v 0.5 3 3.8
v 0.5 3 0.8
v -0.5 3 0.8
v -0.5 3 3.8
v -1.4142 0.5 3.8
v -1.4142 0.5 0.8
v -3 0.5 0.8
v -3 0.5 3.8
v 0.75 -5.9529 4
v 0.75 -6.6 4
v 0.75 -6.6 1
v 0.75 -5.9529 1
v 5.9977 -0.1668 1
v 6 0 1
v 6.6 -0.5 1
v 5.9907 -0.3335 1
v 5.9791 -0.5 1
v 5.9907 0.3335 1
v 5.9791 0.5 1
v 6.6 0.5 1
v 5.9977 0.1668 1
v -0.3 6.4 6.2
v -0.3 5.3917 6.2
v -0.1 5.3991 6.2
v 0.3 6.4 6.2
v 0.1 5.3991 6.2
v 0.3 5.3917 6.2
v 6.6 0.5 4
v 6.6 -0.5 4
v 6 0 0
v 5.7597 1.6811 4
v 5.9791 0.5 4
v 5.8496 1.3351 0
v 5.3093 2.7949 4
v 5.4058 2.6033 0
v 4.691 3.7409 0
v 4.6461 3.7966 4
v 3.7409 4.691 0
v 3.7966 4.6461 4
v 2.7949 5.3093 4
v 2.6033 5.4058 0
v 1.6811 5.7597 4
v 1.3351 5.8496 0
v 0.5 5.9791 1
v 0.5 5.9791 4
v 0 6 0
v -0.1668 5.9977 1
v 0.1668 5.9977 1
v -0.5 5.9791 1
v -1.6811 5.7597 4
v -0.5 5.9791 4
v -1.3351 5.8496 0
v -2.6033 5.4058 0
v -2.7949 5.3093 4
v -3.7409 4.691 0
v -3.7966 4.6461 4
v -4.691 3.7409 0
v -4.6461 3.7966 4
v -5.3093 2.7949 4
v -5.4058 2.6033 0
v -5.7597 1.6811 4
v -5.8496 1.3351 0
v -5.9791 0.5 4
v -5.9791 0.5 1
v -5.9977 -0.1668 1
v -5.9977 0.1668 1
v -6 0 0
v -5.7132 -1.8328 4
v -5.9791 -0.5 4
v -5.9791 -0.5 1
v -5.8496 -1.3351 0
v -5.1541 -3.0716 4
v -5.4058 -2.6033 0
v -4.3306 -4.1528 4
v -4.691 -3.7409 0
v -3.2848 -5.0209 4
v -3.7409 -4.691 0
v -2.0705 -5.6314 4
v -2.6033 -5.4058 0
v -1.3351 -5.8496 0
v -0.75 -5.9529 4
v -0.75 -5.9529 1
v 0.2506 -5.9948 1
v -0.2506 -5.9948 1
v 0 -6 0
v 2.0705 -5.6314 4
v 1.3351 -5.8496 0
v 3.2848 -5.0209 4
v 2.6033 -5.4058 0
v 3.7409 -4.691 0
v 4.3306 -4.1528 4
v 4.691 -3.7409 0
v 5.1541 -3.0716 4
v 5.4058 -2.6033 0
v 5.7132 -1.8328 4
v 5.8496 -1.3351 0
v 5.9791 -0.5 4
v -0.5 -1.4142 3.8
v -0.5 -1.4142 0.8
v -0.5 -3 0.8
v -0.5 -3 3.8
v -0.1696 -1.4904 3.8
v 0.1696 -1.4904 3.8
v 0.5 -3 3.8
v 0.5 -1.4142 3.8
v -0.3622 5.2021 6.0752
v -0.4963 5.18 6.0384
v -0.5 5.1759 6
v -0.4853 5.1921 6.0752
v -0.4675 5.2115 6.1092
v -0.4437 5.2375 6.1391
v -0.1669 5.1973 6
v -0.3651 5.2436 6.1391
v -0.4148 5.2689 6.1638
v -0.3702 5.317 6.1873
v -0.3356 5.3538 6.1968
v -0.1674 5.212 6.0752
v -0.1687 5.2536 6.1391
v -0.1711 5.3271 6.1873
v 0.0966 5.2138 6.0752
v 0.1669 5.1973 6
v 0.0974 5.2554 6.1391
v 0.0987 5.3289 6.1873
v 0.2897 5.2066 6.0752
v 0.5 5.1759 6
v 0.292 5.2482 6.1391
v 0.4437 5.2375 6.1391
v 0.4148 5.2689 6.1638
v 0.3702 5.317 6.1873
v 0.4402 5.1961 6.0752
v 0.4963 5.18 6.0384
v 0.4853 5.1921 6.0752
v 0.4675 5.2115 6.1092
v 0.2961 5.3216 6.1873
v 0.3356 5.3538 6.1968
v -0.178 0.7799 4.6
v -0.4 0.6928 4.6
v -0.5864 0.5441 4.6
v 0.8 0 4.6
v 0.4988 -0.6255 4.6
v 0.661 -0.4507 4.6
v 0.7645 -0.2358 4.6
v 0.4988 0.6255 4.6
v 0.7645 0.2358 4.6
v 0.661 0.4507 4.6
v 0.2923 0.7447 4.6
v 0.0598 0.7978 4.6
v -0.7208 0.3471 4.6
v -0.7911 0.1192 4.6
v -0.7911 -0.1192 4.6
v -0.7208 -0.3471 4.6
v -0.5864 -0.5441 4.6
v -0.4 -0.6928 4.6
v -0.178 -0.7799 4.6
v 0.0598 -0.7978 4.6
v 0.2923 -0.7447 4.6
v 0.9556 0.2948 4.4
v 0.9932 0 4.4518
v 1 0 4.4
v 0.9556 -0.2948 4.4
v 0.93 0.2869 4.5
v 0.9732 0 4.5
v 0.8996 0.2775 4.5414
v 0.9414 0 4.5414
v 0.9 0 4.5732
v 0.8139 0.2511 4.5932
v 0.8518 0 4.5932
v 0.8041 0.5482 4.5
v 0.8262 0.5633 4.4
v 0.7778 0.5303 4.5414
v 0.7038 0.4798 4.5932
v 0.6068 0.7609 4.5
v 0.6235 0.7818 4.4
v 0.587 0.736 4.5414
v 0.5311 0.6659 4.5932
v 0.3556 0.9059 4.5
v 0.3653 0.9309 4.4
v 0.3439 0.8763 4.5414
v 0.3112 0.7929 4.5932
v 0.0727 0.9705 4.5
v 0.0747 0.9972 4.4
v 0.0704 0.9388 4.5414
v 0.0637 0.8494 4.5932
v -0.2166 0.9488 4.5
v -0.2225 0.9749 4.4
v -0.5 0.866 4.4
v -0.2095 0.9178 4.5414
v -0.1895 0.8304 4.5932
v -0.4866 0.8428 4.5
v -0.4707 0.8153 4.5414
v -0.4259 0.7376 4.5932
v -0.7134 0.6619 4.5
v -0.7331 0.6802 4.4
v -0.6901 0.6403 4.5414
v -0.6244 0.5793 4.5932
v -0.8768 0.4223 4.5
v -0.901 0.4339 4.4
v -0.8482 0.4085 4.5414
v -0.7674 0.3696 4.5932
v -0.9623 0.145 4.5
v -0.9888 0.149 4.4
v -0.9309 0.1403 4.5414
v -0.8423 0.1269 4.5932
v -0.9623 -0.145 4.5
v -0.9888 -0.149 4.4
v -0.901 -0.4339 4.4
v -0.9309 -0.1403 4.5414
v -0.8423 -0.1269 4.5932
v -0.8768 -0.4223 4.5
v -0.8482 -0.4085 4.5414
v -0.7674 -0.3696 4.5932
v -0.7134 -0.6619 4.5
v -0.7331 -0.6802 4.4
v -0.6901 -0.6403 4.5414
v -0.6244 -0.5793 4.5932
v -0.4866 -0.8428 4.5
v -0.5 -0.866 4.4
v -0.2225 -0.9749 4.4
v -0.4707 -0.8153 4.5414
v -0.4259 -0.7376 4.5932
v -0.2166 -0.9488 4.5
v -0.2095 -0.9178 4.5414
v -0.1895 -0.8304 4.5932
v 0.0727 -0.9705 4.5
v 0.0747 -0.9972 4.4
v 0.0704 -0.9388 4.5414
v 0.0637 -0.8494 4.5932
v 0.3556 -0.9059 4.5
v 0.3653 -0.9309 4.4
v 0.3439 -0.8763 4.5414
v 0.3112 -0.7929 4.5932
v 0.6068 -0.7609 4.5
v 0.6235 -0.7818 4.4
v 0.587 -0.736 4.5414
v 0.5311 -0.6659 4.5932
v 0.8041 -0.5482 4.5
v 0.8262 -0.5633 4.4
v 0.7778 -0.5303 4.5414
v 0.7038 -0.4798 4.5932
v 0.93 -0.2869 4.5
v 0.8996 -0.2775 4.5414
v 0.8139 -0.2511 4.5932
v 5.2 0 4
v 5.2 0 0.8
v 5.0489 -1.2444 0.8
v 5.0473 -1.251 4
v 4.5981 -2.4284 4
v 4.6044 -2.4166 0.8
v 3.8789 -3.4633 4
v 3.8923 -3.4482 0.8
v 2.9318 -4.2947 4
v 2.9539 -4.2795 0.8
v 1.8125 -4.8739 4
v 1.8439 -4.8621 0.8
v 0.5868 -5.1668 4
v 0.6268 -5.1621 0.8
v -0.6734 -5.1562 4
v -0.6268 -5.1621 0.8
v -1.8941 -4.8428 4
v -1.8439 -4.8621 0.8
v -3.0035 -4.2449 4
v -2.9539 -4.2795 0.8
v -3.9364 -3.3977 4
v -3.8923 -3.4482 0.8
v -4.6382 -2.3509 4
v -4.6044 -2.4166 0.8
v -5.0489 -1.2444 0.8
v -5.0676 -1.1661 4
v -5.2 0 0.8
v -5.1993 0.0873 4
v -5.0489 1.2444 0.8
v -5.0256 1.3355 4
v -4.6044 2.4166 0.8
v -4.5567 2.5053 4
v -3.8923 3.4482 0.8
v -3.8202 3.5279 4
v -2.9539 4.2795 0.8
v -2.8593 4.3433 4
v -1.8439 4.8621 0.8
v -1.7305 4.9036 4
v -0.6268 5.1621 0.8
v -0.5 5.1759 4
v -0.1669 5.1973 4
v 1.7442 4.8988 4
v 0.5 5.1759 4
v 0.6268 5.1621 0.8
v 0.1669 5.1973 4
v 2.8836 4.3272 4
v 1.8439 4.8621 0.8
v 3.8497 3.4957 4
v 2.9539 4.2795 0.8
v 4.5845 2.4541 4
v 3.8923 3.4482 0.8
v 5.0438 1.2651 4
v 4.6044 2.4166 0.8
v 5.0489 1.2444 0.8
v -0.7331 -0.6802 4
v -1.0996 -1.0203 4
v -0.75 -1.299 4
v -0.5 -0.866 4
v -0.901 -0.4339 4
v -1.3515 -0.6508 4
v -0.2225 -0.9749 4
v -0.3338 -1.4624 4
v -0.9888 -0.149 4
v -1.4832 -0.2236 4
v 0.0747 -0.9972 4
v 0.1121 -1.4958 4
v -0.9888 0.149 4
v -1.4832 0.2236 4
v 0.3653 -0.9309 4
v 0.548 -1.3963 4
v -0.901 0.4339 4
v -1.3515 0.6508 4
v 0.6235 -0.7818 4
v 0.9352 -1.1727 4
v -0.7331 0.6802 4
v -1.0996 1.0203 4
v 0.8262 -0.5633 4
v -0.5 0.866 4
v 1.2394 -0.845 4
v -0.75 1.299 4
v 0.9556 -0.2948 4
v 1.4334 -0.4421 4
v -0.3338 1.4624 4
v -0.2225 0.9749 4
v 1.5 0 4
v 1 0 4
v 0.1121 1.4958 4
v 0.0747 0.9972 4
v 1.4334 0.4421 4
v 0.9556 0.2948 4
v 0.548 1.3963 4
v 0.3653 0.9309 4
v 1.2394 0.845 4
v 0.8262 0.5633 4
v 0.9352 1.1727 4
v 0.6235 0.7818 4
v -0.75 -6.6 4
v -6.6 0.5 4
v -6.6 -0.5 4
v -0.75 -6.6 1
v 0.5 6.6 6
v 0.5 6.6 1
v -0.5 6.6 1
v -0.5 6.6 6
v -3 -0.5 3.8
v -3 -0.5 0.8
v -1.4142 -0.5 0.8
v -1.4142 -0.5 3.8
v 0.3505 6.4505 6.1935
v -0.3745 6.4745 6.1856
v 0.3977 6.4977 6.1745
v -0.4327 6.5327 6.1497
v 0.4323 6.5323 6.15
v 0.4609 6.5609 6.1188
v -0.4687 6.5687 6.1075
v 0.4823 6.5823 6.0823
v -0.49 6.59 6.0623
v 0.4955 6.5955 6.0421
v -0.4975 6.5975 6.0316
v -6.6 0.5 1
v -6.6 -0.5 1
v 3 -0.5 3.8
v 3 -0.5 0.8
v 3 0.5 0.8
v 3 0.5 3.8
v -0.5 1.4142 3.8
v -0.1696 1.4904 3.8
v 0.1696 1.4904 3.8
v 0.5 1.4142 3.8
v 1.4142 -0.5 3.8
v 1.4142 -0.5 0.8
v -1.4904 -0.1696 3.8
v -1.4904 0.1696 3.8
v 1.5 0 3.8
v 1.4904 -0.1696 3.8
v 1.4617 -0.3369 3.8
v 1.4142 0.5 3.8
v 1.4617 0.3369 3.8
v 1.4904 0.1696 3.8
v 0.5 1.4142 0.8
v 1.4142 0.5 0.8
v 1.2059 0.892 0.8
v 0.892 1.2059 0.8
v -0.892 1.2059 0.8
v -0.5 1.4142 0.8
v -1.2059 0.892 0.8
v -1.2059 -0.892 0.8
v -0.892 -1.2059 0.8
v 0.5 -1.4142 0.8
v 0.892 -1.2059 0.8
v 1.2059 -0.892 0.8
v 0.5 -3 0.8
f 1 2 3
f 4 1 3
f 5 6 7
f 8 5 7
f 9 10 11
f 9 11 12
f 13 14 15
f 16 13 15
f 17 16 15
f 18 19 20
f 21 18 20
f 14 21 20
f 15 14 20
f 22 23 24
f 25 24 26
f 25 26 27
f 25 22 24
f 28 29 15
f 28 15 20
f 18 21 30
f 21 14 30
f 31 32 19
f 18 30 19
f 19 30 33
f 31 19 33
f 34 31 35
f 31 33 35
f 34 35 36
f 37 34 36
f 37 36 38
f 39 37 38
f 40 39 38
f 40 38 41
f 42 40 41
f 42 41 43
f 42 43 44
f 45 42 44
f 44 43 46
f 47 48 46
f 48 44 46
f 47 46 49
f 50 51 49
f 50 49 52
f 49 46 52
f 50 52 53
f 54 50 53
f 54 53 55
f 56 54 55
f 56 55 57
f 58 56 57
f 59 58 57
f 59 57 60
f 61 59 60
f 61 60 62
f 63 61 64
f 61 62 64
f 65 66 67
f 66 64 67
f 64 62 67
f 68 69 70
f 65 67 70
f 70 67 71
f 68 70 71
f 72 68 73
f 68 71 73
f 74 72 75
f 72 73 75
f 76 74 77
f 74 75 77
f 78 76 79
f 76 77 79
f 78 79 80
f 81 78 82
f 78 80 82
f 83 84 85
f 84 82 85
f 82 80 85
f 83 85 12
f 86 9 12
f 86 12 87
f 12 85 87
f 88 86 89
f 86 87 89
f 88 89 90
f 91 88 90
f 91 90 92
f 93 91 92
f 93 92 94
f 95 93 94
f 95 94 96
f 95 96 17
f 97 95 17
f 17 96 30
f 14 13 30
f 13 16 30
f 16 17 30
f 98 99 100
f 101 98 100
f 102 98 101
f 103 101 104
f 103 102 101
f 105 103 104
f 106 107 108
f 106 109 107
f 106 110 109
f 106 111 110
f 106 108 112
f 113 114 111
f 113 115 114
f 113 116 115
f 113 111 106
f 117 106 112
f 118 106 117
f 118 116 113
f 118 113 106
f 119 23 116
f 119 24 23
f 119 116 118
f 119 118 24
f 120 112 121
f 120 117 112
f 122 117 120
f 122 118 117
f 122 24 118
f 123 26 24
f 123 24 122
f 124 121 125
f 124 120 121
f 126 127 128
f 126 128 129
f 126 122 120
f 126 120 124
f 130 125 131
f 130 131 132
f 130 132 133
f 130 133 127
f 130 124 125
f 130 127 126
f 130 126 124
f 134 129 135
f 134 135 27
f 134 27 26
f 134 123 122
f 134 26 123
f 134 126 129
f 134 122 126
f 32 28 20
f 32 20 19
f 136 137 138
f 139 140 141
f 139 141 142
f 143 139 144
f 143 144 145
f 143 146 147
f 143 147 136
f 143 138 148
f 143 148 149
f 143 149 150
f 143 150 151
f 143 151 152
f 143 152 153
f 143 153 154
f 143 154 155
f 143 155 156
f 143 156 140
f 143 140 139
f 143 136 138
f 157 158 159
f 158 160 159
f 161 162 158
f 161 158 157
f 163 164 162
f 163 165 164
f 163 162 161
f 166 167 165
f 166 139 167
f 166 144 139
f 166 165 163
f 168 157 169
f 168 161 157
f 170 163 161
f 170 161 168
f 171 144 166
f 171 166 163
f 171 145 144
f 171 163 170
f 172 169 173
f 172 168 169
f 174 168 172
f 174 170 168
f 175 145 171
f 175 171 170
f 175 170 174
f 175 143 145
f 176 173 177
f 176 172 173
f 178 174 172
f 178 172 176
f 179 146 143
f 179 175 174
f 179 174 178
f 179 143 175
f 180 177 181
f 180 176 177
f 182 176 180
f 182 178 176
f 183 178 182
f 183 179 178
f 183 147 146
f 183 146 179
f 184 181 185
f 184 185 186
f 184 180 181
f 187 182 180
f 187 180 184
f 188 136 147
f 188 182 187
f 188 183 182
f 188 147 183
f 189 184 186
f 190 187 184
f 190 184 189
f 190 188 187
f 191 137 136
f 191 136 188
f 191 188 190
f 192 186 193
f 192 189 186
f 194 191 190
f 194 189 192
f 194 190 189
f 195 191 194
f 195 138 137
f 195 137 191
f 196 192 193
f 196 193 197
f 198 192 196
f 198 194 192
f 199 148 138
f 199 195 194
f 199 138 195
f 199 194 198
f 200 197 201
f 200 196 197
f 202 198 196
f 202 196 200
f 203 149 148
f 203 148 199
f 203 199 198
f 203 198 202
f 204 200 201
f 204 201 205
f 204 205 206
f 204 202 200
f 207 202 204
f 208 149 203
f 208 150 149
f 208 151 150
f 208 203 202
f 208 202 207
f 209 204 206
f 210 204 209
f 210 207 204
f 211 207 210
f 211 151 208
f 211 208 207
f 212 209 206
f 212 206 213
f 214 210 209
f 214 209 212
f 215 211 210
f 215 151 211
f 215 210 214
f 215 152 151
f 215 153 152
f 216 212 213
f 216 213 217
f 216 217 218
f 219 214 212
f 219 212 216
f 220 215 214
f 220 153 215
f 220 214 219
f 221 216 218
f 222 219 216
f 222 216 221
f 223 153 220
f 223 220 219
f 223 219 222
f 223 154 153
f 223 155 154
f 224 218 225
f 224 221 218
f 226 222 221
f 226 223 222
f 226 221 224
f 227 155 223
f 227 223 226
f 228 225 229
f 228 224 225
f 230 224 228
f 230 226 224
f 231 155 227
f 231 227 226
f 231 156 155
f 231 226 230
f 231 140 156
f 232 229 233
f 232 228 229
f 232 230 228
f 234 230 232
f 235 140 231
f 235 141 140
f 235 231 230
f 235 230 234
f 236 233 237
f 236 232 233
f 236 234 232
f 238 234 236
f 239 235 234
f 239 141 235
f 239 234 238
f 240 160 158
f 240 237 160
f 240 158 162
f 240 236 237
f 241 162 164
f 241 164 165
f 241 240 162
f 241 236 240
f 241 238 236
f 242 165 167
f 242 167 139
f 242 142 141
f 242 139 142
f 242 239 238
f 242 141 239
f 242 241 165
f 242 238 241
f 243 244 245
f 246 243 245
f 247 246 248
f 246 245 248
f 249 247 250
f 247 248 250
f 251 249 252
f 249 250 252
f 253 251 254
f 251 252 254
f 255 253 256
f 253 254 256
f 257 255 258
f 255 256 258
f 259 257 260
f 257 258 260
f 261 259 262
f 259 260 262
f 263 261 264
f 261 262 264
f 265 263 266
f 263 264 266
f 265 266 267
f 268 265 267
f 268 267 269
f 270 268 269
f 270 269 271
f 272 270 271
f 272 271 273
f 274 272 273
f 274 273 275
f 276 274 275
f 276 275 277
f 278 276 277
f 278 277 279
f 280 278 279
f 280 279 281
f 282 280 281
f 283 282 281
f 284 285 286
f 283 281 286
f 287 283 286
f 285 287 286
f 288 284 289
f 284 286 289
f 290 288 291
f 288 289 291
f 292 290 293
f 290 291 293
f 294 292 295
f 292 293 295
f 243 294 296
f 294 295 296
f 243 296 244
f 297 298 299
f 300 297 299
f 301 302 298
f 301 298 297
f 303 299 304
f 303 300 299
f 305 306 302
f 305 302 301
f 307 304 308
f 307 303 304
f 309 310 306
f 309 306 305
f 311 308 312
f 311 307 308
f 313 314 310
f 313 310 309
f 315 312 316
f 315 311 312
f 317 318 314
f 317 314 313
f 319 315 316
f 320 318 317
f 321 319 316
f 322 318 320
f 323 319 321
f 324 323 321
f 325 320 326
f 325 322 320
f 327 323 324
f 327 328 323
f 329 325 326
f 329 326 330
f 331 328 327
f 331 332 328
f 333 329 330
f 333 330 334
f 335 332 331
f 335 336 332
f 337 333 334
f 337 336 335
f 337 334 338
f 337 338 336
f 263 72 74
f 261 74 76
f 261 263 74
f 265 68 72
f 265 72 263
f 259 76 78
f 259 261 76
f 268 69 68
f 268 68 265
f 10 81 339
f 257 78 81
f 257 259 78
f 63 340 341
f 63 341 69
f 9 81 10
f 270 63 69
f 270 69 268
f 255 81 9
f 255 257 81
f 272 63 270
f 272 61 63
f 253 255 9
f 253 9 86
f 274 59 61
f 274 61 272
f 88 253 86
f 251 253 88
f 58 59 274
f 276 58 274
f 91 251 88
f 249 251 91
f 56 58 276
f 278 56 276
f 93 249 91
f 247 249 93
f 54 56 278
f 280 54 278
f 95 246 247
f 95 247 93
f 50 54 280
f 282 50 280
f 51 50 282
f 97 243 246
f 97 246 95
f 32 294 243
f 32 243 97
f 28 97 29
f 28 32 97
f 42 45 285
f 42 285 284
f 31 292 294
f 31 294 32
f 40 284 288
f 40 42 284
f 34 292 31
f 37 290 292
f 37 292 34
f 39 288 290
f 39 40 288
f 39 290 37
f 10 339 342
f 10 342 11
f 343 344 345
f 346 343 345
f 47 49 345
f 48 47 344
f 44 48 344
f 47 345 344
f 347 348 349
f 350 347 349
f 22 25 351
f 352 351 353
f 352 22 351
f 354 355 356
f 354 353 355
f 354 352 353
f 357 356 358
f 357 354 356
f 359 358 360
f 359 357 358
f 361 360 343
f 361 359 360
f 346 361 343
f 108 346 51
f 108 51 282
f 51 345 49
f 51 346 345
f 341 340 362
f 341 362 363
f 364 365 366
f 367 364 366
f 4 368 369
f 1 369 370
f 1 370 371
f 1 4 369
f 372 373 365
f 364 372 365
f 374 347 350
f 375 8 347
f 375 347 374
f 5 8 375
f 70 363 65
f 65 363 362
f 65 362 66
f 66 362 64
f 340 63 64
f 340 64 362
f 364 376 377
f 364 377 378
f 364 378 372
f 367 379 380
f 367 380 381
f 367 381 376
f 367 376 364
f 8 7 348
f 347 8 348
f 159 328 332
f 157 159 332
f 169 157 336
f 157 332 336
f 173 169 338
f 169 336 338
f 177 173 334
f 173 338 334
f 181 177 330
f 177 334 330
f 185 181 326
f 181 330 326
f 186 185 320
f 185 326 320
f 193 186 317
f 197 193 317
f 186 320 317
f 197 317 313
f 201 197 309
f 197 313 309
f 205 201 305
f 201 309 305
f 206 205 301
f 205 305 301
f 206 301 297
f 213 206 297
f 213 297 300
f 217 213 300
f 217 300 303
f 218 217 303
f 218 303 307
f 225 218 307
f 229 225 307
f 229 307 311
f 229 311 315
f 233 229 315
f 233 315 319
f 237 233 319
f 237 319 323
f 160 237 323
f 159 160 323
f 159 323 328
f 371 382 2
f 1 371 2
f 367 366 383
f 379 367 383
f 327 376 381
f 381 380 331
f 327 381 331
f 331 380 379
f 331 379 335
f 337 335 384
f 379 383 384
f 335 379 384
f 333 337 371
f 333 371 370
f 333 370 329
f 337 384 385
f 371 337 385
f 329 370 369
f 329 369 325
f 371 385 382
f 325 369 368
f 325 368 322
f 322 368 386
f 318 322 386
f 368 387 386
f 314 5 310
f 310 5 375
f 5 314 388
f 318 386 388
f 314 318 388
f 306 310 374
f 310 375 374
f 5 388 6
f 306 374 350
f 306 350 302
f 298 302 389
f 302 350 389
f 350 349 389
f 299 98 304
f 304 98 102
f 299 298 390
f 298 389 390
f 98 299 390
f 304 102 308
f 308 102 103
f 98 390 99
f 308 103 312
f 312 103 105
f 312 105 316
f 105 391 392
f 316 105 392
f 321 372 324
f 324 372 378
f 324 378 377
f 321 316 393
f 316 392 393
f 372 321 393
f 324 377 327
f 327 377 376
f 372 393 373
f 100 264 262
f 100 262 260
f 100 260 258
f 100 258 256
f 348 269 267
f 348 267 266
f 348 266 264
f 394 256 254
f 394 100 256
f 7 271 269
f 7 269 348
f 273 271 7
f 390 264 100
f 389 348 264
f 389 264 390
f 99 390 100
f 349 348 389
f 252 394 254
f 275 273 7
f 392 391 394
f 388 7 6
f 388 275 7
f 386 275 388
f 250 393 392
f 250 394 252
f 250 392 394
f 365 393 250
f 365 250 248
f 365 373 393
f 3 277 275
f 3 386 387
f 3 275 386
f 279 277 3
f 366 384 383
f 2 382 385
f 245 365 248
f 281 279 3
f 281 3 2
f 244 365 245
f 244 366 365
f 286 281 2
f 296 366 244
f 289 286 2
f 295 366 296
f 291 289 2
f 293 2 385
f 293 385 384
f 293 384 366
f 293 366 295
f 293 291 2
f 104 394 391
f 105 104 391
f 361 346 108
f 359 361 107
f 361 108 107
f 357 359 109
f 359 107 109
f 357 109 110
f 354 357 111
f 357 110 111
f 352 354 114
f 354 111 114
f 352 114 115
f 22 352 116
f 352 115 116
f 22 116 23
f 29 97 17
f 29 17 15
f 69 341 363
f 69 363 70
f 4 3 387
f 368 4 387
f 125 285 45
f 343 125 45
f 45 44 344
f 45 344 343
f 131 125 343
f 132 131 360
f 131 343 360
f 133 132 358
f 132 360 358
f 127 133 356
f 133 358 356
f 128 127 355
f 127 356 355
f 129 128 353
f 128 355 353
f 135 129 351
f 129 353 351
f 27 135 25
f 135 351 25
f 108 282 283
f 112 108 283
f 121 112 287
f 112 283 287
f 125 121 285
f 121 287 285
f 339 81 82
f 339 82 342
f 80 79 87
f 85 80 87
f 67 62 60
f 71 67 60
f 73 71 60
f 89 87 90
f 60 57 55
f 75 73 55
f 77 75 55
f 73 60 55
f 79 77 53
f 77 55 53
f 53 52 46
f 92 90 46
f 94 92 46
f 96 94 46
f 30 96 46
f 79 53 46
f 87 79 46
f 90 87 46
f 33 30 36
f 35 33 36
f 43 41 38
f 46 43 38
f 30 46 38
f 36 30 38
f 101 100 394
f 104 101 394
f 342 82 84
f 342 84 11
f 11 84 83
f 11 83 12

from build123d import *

# Parameters (mm, degrees)
SKETCH_4_R          = 6
EXTRUDE_7_DEPTH     = 4
SKETCH_6_R          = 5.2
CUT_EXTRUDE_3_DEPTH = 3.2
EXTRUDE_8_DEPTH     = 3
EXTRUDE_9_DEPTH     = 2.2
SKETCH_8_R          = 1.5
EXTRUDE_10_DEPTH    = 3.2
EXTRUDE_11_DEPTH    = 3
SKETCH_8_8_R        = 1
EXTRUDE_12_DEPTH    = 3.8
FILLET_1_R          = 0.2


with BuildPart() as part:
    # Sketch 4 → Extrude 7 (new body)
    with BuildSketch(Plane.XY):
        Circle(SKETCH_4_R)
    extrude(amount=EXTRUDE_7_DEPTH)

    # Sketch 6 → Cut-Extrude 3 (cut)
    with BuildSketch(Plane.XY.offset(4)):
        Circle(SKETCH_6_R)
    extrude(amount=-CUT_EXTRUDE_3_DEPTH, mode=Mode.SUBTRACT)

    # Sketch 7 → Extrude 8 (add)
    with BuildSketch(Plane.XY.offset(4)):
        with BuildLine():
            Line((0.5, 6.6), (-0.5, 6.6))
            Line((-0.5, 6.6), (-0.5, 5.979130372))
            ThreePointArc((-0.5, 5.979130372), (0, 6), (0.5, 5.979130372))
            Line((0.5, 5.979130372), (0.5, 6.6))
        make_face()
        with BuildLine():
            ThreePointArc((0.75, -5.95294045), (0, -6), (-0.75, -5.95294045))
            Line((-0.75, -5.95294045), (-0.75, -6.6))
            Line((-0.75, -6.6), (0.75, -6.6))
            Line((0.75, -6.6), (0.75, -5.95294045))
        make_face()
        with BuildLine():
            ThreePointArc((-5.979130372, -0.5), (-6, 0), (-5.979130372, 0.5))
            Line((-5.979130372, 0.5), (-6.6, 0.5))
            Line((-6.6, 0.5), (-6.6, -0.5))
            Line((-6.6, -0.5), (-5.979130372, -0.5))
        make_face()
        with BuildLine():
            Line((6.6, 0.5), (5.979130372, 0.5))
            ThreePointArc((5.979130372, 0.5), (5.994780322, 0.250217676), (6, 0))
            ThreePointArc((6, 0), (5.994780322, -0.250217676), (5.979130372, -0.5))
            Line((5.979130372, -0.5), (6.6, -0.5))
            Line((6.6, -0.5), (6.6, 0.5))
        make_face()
    extrude(amount=-EXTRUDE_8_DEPTH)

    # Sketch 7_3 → Extrude 9 (add)
    with BuildSketch(Plane.XY.offset(4)):
        with BuildLine():
            Line((0.5, 6.6), (-0.5, 6.6))
            Line((-0.5, 6.6), (-0.5, 5.979130372))
            ThreePointArc((-0.5, 5.979130372), (0, 6), (0.5, 5.979130372))
            Line((0.5, 5.979130372), (0.5, 6.6))
        make_face()
        with BuildLine():
            ThreePointArc((0.5, 5.979130372), (0, 6), (-0.5, 5.979130372))
            Line((-0.5, 5.979130372), (-0.5, 5.175905718))
            ThreePointArc((-0.5, 5.175905718), (0, 5.2), (0.5, 5.175905718))
            Line((0.5, 5.175905718), (0.5, 5.979130372))
        make_face()
    extrude(amount=EXTRUDE_9_DEPTH)

    # Sketch 8 → Extrude 10 (add)
    with BuildSketch(Plane.XY.offset(0.8)):
        Circle(SKETCH_8_R)
    extrude(amount=EXTRUDE_10_DEPTH)

    # Sketch 8_3 → Extrude 11 (add)
    with BuildSketch(Plane.XY.offset(0.8)):
        with BuildLine():
            Line((-1.414213562, 0.5), (-3, 0.5))
            Line((-3, 0.5), (-3, -0.5))
            Line((-3, -0.5), (-1.414213562, -0.5))
            ThreePointArc((-1.414213562, -0.5), (-1.5, 0), (-1.414213562, 0.5))
        make_face()
        with BuildLine():
            Line((-0.5, 3), (-0.5, 1.414213562))
            ThreePointArc((-0.5, 1.414213562), (0, 1.5), (0.5, 1.414213562))
            Line((0.5, 1.414213562), (0.5, 3))
            Line((0.5, 3), (-0.5, 3))
        make_face()
        with BuildLine():
            Line((3, 0.5), (1.414213562, 0.5))
            ThreePointArc((1.414213562, 0.5), (1.478397839, 0.253652968), (1.5, 0))
            ThreePointArc((1.5, 0), (1.478397839, -0.253652968), (1.414213562, -0.5))
            Line((1.414213562, -0.5), (3, -0.5))
            Line((3, -0.5), (3, 0.5))
        make_face()
        with BuildLine():
            ThreePointArc((0.5, -1.414213562), (0, -1.5), (-0.5, -1.414213562))
            Line((-0.5, -1.414213562), (-0.5, -3))
            Line((-0.5, -3), (0.5, -3))
            Line((0.5, -3), (0.5, -1.414213562))
        make_face()
    extrude(amount=EXTRUDE_11_DEPTH)

    # Sketch 8_8 → Extrude 12 (add)
    with BuildSketch(Plane.XY.offset(0.8)):
        Circle(SKETCH_8_8_R)
    extrude(amount=EXTRUDE_12_DEPTH)

    # Fillet 1
    fillet_1_edges = [part.edges().sort_by_distance(p)[0] for p in [
        (-1, 0, 4.6),
        (0.5, 5.887952859, 6.2),
        (0, 6.6, 6.2),
        (-0.5, 5.887952859, 6.2),
        (0, 5.2, 6.2),
    ]]
    fillet(fillet_1_edges, radius=FILLET_1_R)


solid = part.part
